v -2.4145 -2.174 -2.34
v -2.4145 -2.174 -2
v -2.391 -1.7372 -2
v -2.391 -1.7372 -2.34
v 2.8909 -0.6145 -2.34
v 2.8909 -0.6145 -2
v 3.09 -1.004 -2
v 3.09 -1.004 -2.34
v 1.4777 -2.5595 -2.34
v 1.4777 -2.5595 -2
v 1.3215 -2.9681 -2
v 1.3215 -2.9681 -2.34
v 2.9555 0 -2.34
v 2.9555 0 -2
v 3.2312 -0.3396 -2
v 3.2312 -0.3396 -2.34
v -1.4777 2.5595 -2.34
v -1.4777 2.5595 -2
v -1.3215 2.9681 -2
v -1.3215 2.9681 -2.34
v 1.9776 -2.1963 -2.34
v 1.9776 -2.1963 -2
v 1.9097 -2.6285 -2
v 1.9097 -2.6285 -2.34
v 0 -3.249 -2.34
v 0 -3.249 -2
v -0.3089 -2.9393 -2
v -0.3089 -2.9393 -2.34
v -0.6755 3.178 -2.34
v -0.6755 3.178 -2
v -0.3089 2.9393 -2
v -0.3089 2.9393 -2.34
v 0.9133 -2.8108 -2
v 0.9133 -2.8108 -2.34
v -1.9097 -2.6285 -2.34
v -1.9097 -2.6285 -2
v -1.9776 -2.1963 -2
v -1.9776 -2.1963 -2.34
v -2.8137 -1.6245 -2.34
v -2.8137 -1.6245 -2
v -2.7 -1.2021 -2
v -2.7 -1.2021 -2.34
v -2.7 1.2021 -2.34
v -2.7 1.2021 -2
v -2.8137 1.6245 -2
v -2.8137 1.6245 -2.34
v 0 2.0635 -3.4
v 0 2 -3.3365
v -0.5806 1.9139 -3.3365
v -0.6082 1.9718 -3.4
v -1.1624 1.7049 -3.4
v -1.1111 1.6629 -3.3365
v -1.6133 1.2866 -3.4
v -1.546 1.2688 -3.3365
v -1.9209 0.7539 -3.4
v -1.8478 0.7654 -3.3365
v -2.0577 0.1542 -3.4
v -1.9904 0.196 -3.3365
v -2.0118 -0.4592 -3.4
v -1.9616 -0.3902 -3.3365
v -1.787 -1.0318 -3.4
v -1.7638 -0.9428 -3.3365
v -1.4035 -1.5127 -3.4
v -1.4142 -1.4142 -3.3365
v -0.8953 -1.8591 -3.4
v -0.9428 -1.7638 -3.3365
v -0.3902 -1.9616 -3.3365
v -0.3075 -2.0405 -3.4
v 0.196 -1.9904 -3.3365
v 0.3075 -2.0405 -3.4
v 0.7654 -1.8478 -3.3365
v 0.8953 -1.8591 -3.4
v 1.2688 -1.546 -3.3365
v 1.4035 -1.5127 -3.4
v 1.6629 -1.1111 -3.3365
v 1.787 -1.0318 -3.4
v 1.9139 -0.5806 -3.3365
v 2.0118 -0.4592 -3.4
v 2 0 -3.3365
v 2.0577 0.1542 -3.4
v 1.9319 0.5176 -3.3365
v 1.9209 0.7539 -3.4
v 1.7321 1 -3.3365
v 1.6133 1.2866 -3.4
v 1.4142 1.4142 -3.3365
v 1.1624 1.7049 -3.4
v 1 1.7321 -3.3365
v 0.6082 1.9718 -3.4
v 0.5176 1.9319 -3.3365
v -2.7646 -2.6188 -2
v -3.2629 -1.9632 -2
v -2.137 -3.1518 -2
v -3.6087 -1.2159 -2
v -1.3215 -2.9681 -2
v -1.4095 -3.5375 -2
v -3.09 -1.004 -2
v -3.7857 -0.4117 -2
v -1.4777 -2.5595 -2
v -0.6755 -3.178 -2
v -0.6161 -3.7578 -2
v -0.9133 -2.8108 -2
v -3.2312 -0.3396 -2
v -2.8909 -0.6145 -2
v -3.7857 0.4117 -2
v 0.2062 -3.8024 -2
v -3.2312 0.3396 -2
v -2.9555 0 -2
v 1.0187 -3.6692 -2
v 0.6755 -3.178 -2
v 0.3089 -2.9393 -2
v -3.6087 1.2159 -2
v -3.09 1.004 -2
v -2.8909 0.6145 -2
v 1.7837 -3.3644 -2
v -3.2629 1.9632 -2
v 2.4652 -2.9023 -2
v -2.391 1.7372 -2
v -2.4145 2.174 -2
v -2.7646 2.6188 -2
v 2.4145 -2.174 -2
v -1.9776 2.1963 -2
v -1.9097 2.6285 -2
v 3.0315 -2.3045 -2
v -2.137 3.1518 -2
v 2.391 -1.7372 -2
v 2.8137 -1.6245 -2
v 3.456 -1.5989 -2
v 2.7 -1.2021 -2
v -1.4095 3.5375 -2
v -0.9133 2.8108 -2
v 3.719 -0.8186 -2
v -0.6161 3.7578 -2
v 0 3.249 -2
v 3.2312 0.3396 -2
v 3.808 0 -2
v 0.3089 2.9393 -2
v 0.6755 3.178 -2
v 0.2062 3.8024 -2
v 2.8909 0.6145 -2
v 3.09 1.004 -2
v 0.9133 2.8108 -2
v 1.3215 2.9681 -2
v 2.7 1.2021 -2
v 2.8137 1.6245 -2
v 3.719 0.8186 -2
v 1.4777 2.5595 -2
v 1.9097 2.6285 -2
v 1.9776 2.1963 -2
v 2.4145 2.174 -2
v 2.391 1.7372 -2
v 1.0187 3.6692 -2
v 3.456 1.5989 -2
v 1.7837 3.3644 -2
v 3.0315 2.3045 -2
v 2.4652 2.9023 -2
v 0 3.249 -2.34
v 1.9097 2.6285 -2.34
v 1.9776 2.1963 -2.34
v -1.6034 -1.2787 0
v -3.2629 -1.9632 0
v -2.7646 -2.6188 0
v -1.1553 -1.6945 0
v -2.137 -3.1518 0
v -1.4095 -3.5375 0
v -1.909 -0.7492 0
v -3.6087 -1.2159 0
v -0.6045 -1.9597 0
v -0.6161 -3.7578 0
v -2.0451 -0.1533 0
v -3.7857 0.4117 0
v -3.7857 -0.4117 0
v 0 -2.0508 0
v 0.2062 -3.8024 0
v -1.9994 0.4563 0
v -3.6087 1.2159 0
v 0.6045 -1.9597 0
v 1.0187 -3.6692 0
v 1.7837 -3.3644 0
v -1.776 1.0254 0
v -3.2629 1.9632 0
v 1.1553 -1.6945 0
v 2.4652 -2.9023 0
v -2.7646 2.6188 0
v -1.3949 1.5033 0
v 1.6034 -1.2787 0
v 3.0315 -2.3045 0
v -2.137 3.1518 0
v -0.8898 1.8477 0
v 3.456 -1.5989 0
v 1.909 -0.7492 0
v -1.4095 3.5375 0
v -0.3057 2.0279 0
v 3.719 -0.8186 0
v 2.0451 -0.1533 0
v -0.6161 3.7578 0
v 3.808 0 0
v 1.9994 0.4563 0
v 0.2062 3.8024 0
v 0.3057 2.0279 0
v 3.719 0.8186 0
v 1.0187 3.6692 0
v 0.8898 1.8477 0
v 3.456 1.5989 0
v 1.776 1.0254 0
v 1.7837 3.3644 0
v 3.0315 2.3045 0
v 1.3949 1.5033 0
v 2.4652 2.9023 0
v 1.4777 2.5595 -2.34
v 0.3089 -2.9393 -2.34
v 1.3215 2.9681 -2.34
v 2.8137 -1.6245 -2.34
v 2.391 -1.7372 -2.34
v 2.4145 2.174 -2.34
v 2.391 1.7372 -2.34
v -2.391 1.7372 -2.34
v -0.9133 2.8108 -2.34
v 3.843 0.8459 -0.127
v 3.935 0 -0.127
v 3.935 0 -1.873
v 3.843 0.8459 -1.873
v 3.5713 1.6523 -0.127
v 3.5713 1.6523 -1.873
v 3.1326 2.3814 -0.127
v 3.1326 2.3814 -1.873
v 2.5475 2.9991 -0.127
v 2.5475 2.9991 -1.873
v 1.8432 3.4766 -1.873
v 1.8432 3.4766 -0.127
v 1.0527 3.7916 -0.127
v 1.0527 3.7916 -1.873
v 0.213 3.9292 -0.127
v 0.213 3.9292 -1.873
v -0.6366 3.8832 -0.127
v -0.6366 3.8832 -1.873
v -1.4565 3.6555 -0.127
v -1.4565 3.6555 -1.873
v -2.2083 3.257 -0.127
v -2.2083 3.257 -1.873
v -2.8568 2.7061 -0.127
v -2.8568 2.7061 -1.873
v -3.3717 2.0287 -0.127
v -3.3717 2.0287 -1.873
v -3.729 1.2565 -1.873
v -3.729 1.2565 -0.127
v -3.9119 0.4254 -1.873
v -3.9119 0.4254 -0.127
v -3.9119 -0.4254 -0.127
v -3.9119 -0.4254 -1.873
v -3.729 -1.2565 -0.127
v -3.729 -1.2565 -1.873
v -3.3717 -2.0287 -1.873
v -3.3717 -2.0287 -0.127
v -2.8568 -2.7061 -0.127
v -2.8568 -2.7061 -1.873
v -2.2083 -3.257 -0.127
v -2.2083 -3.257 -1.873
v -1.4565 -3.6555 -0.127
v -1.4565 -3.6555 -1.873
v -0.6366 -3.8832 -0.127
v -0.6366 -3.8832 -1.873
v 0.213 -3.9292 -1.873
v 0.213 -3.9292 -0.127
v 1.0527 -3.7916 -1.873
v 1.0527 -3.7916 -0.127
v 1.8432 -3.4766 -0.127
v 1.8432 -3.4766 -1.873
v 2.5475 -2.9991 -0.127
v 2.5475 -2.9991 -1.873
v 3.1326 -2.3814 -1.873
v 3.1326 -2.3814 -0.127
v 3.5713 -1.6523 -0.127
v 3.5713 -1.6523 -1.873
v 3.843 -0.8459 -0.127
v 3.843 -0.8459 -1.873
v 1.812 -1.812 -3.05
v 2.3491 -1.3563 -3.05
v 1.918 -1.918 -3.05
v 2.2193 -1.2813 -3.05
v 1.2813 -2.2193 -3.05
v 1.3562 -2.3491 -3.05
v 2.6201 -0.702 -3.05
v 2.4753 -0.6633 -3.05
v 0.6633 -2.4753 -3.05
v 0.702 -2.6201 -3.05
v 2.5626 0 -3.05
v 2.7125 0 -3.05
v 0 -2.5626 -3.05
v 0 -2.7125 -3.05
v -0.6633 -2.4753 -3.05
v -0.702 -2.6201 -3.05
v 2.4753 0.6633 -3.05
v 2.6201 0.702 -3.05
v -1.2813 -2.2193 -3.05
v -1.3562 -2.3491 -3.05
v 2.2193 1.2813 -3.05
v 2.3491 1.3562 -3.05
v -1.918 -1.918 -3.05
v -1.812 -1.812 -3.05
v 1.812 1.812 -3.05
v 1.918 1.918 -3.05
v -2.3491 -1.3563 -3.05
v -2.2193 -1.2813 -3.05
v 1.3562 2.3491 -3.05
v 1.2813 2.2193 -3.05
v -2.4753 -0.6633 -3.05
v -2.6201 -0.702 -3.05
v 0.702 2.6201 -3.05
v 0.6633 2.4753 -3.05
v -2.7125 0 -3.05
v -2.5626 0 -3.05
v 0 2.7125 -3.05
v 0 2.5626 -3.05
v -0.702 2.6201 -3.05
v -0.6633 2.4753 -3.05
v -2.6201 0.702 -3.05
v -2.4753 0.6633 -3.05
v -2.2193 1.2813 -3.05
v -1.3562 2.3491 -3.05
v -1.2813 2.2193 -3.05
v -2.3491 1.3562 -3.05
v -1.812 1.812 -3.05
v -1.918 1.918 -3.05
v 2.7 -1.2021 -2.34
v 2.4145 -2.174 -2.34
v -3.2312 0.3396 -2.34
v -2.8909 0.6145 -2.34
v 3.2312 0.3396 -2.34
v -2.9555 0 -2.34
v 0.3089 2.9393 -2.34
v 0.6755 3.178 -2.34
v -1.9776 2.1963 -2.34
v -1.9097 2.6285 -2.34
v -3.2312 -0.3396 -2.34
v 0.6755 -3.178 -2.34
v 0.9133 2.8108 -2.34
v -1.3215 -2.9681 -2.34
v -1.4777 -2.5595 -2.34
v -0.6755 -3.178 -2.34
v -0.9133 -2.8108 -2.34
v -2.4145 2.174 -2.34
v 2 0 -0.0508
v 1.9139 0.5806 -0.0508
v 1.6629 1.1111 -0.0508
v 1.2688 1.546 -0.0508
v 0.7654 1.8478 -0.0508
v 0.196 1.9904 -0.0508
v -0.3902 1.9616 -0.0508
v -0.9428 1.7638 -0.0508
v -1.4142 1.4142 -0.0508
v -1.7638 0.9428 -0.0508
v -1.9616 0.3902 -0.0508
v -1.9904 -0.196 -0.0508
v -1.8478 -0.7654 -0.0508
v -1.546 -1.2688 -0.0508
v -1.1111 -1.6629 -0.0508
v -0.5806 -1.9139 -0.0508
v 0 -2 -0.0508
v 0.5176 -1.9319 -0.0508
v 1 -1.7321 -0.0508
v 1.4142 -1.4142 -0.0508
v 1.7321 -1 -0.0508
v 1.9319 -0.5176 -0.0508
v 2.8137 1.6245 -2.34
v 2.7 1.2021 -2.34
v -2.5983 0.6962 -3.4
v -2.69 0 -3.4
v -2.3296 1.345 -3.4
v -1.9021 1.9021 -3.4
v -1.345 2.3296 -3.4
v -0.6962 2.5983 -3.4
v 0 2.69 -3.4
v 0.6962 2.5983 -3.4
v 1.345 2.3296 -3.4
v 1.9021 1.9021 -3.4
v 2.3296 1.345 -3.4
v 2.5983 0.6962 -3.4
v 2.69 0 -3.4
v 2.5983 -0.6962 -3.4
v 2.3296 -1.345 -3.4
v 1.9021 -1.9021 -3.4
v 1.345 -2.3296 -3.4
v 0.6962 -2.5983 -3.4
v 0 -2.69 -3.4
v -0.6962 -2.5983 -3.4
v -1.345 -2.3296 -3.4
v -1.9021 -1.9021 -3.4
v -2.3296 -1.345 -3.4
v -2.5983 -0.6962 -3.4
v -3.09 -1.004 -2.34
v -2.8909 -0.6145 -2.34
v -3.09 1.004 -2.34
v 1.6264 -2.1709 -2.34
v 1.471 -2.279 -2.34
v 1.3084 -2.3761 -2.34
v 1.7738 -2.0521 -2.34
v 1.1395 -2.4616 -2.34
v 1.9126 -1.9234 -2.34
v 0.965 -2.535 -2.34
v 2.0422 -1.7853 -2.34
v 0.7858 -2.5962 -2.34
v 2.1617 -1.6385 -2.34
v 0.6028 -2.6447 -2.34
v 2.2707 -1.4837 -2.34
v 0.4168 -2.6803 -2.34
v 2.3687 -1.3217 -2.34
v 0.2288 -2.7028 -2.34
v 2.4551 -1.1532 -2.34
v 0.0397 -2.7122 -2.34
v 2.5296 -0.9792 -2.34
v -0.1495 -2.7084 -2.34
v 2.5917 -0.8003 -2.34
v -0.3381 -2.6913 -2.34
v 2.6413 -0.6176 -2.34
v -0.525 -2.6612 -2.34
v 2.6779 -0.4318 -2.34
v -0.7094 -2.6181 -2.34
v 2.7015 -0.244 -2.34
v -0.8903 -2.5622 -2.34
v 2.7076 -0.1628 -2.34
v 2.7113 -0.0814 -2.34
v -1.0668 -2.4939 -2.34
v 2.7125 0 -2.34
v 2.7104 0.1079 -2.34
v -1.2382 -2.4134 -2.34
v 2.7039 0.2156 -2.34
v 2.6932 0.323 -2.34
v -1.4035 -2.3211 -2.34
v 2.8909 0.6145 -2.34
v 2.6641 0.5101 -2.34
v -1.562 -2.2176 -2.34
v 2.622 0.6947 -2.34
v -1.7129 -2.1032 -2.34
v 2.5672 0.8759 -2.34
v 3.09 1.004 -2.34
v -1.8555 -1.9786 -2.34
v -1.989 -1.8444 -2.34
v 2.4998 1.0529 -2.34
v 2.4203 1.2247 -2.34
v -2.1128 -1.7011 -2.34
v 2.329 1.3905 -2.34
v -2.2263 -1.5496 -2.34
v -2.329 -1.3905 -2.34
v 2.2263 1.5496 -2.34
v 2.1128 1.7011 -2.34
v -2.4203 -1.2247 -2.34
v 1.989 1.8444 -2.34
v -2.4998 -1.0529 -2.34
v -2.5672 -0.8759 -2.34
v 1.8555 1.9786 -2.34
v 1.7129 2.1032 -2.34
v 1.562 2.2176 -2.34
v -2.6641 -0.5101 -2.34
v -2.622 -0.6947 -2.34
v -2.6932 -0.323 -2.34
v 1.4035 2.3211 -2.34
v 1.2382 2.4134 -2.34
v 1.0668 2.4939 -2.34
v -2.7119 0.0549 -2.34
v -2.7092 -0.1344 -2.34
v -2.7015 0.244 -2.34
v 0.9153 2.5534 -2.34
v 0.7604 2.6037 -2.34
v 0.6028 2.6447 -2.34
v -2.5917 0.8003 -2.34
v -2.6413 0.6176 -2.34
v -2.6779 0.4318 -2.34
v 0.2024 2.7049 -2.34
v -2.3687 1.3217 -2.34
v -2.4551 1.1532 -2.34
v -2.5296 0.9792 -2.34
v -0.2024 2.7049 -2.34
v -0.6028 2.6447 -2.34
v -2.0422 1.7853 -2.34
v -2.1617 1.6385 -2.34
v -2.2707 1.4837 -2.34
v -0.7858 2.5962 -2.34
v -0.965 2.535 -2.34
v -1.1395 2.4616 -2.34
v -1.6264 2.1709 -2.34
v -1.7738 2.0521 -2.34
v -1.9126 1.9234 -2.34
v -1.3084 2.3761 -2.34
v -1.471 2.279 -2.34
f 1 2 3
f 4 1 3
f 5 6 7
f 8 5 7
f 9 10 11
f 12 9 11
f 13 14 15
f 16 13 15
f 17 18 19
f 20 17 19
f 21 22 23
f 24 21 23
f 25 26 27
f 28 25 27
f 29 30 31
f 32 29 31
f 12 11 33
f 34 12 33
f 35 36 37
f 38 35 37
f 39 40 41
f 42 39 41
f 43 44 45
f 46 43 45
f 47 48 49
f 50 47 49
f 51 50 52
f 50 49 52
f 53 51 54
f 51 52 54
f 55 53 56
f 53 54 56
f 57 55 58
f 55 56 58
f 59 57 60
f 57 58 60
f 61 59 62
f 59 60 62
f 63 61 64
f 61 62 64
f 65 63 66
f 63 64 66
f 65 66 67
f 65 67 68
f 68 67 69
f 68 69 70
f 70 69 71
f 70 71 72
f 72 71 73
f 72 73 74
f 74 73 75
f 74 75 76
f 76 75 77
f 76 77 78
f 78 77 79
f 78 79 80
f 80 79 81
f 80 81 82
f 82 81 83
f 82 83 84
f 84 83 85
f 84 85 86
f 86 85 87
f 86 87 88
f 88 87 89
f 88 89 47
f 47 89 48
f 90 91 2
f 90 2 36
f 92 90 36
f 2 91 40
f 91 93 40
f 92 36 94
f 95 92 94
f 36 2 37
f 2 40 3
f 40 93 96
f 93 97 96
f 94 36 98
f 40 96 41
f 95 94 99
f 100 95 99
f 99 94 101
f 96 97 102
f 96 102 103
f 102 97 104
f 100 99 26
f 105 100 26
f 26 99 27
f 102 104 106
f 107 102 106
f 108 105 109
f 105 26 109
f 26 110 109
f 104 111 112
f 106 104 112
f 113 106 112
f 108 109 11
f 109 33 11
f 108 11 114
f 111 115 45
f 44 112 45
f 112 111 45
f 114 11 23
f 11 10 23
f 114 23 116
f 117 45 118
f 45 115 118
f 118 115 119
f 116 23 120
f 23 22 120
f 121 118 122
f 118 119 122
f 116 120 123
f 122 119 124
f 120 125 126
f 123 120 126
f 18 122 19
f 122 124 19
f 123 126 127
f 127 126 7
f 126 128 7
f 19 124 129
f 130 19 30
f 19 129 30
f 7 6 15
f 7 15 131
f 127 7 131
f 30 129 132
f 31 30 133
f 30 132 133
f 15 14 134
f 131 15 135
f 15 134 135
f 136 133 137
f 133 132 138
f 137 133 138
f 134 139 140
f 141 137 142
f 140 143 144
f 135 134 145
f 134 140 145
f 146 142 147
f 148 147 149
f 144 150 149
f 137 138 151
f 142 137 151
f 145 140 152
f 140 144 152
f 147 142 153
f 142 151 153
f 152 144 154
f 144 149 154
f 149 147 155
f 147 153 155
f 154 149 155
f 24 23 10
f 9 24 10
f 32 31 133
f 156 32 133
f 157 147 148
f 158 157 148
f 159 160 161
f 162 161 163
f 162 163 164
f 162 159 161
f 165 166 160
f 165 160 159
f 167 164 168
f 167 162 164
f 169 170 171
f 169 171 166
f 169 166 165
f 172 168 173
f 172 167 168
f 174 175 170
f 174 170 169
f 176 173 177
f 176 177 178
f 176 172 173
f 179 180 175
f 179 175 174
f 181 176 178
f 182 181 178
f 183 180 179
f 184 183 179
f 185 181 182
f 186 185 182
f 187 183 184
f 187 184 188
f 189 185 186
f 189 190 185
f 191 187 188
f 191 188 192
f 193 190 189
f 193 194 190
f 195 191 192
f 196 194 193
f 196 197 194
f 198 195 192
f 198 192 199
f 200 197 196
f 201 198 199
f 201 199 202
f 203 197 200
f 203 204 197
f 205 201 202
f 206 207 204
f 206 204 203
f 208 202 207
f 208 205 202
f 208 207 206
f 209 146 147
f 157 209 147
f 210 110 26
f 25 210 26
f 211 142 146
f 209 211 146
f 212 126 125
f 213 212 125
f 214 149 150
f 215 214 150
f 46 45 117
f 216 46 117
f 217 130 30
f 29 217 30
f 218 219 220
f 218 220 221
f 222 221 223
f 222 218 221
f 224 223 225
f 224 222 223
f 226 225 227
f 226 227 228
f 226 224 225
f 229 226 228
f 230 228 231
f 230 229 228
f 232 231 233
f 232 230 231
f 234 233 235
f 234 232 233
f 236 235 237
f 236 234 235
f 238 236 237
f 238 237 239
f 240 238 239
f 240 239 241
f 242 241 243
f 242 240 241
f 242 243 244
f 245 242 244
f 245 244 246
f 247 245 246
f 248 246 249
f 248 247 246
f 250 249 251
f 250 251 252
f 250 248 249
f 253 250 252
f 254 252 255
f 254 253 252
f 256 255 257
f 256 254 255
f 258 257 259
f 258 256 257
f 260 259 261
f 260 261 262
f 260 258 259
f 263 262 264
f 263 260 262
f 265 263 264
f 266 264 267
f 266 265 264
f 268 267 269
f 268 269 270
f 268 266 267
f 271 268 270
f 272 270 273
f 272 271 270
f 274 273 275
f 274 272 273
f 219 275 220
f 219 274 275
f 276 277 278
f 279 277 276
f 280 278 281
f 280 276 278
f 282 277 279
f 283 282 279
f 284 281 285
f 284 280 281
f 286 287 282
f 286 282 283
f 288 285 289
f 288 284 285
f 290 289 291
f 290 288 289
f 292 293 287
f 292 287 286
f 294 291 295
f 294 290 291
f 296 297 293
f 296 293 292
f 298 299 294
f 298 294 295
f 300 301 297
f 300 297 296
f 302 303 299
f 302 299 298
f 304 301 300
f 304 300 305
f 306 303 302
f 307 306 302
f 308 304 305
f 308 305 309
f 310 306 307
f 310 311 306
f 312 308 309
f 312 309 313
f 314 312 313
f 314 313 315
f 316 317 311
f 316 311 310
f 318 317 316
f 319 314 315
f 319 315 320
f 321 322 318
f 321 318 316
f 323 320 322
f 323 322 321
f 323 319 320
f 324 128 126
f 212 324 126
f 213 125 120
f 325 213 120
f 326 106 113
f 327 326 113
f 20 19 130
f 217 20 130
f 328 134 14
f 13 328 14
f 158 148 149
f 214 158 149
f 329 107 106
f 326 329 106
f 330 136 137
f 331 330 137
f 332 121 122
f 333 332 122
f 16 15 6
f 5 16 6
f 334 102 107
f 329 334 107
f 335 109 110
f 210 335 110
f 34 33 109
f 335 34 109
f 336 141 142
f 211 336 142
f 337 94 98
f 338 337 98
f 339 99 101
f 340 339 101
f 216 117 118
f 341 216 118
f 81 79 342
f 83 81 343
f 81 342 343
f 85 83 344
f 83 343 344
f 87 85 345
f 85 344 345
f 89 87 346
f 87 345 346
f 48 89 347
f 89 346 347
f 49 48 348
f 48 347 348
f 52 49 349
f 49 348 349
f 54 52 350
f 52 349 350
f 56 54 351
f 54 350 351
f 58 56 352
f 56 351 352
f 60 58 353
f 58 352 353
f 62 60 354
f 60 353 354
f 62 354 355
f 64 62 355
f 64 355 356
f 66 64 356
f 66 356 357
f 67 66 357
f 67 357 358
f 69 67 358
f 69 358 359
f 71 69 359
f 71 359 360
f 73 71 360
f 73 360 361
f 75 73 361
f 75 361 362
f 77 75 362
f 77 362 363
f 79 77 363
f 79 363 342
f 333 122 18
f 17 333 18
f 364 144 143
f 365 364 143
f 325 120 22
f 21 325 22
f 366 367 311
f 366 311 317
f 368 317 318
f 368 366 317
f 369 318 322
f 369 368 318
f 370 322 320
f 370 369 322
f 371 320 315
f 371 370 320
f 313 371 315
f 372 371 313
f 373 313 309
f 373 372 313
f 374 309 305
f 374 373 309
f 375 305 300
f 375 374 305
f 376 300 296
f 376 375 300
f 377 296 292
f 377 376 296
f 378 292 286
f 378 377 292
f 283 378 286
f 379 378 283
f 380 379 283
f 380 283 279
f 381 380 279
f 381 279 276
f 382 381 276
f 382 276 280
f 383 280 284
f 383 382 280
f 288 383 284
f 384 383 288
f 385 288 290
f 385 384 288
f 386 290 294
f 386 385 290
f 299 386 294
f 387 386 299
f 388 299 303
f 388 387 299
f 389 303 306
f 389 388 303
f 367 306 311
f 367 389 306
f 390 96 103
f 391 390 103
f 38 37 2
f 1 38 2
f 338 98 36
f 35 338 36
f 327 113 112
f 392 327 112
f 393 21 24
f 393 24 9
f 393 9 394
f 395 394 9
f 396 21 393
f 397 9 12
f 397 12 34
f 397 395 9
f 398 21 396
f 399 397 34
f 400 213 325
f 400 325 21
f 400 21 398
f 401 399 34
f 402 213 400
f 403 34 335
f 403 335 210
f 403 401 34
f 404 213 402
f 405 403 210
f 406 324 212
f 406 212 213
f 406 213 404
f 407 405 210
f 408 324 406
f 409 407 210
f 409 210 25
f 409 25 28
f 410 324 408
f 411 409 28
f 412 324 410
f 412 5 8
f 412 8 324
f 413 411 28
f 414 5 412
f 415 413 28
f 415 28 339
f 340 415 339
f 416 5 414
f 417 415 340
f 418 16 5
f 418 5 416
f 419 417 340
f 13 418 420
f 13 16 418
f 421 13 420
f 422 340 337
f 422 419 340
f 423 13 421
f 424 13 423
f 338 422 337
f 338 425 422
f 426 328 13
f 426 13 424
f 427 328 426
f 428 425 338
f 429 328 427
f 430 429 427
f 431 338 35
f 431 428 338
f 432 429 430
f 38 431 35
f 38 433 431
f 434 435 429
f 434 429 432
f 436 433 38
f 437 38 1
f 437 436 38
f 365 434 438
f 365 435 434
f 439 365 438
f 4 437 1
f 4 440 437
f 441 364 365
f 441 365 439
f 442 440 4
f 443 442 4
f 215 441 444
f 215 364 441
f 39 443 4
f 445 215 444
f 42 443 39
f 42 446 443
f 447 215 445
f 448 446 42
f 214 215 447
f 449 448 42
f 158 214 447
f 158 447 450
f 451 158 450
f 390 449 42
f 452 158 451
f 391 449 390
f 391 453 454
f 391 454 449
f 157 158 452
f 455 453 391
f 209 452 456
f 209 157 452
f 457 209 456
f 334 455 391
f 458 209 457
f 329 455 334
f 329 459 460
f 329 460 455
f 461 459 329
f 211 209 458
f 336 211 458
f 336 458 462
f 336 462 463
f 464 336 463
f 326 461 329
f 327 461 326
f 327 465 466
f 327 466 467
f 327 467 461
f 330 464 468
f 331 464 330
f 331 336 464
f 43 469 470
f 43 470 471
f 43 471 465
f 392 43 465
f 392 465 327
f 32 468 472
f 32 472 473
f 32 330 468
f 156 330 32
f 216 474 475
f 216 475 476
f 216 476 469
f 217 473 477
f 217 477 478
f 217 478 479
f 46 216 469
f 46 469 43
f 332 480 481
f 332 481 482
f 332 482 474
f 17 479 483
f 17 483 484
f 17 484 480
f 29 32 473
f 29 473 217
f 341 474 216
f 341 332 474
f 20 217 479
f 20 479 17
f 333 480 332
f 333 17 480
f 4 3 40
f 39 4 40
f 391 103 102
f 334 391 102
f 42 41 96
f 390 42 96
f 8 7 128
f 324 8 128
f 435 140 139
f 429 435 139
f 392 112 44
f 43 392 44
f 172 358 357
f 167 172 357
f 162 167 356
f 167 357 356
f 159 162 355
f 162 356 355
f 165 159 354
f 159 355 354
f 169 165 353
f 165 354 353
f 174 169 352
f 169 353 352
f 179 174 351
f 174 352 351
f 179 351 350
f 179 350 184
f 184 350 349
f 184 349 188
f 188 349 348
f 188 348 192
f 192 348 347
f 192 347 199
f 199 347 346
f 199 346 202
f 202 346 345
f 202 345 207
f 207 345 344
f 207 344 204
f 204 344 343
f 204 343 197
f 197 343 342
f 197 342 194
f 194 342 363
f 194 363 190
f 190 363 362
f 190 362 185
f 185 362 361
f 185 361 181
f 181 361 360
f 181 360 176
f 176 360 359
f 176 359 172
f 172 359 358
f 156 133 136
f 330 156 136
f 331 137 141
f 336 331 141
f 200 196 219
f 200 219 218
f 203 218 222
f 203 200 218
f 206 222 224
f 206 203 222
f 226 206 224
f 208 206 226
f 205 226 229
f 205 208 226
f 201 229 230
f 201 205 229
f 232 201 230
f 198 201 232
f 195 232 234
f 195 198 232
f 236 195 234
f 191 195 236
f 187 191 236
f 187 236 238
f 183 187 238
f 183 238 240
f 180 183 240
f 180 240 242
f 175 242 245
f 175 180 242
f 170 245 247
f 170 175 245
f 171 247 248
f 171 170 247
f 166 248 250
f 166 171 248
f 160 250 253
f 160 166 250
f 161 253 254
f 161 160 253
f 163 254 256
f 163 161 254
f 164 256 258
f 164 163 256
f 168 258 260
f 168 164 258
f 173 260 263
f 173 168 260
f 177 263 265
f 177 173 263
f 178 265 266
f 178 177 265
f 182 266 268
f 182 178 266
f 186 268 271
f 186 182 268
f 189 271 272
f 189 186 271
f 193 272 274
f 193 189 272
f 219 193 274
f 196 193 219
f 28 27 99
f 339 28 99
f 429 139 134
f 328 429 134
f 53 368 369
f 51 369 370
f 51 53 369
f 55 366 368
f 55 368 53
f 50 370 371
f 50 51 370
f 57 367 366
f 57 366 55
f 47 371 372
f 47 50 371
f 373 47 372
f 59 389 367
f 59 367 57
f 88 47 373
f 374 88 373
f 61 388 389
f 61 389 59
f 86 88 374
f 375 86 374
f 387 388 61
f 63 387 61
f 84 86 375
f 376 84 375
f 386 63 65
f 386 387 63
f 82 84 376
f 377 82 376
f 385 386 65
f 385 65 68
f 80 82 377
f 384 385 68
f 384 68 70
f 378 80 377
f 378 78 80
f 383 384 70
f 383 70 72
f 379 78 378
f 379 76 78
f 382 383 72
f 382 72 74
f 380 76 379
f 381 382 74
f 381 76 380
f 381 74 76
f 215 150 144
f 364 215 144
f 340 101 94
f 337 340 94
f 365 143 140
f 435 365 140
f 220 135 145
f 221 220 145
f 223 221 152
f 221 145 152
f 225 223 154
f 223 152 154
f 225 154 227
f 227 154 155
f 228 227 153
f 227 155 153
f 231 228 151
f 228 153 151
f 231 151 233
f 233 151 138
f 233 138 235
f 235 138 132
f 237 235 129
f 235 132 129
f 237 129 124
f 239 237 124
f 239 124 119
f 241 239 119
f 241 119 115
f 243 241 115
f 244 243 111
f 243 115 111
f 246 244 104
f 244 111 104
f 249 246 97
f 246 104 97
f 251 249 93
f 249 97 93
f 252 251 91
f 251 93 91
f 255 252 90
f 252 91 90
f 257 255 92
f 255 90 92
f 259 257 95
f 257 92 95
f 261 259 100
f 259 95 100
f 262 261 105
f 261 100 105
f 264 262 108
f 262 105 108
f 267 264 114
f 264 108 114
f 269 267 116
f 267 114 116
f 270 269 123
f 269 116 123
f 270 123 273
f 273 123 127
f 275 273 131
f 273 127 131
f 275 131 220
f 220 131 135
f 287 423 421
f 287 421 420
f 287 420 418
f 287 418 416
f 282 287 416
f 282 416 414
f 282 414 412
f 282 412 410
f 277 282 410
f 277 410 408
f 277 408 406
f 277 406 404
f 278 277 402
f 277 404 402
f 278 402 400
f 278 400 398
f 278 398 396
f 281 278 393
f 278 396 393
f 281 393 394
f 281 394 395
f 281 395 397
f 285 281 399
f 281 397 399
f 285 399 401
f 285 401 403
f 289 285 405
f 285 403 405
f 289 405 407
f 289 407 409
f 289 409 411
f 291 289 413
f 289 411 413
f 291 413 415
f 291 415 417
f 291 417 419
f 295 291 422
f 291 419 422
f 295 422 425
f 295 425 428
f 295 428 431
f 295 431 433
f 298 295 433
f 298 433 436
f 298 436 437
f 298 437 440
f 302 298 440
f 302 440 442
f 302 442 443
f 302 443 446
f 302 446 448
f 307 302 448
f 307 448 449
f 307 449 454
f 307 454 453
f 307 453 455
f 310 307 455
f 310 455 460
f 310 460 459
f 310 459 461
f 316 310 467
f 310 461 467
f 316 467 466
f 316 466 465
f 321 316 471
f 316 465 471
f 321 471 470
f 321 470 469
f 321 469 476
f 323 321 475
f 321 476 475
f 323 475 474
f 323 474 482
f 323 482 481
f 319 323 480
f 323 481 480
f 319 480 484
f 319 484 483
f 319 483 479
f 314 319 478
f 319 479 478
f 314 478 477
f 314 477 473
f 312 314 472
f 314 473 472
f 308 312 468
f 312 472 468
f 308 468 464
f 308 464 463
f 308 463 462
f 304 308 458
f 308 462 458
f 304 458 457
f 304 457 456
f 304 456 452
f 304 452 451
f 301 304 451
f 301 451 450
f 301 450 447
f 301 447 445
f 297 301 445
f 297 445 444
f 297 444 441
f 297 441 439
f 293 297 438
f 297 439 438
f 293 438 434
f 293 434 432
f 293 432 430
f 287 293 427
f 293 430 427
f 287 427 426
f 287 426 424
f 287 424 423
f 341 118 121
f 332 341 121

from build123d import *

# Parameters (mm, degrees)
SKETCH1_R           = 3.935
EXTRUDE1_DEPTH      = 2
SKETCH2_R           = 2.7125
EXTRUDE2_DEPTH      = 1.4
SKETCH5_OUTSIDE_W   = 12.452
SKETCH5_OUTSIDE_H   = 12.452
SKETCH5_OUTSIDE_R   = 2.69
CUT_EXTRUDE1_DEPTH  = 0.35
CUT_EXTRUDE1_DRAFT  = 20
CHAMFER2_SIZE       = 0.127
SKETCH7_R           = 2
CUT_EXTRUDE3_DEPTH  = 7.521384056
BOSS_EXTRUDE1_DEPTH = 0.34
CIRPATTERN4_COUNT   = 30


with BuildPart() as part:
    # Sketch1 → Extrude1 (new body)
    with BuildSketch(Plane.XY):
        Circle(SKETCH1_R)
    extrude(amount=-EXTRUDE1_DEPTH)

    # Sketch2 → Extrude2 (add)
    with BuildSketch(Plane(origin=(0, 0, -2), x_dir=(-1, 0, 0), z_dir=(0, 0, -1))):
        Circle(SKETCH2_R)
    extrude(amount=EXTRUDE2_DEPTH)


with BuildPart() as cut_extrude1_tool:
    # Sketch5 outside → Cut-Extrude1 (with draft: the straight prism first)
    with BuildSketch(Plane(origin=(0, 0, -3.4), x_dir=(-1, 0, 0), z_dir=(0, 0, -1))):
        Rectangle(SKETCH5_OUTSIDE_W, SKETCH5_OUTSIDE_H)
        Circle(SKETCH5_OUTSIDE_R, mode=Mode.SUBTRACT)
    extrude(amount=-CUT_EXTRUDE1_DEPTH)
    # Cut-Extrude1: the draft: its side faces are tilted about the plane it starts from
    cut_extrude1_sides = [cut_extrude1_tool.faces().sort_by_distance(p)[0] for p in [
        (0, -6.226, -3.225),
        (-6.226, 0, -3.225),
        (0, 6.226, -3.225),
        (6.226, 0, -3.225),
        (2.69, 0, -3.225),
    ]]
    draft(cut_extrude1_sides, Plane(origin=(0, 0, -3.4), x_dir=(-1, 0, 0), z_dir=(0, 0, -1)), CUT_EXTRUDE1_DRAFT)


with BuildPart() as part_1:
    add(part.part)

    # Cut-Extrude1: cut by cut_extrude1_tool
    add(cut_extrude1_tool.part, mode=Mode.SUBTRACT)

    # Chamfer2
    chamfer2_edges = [part_1.edges().sort_by_distance(p)[0] for p in [
        (-3.935, 0, 0),
        (-3.935, 0, -2),
    ]]
    chamfer(chamfer2_edges, length=CHAMFER2_SIZE)

    # Sketch7 → Cut-Extrude3 (cut, through all)
    with BuildSketch(Plane.XY):
        Circle(SKETCH7_R)
    extrude(amount=-CUT_EXTRUDE3_DEPTH, mode=Mode.SUBTRACT)

    # Cut-Extrude6 cone 1 section (through the dimple's axis) → Cut-Extrude6 (revolve, cut)
    with BuildSketch(Plane(origin=(0, 0, 0), x_dir=(0, -1, 0), z_dir=(1, 0, 0))):
        Polygon((0, 0), (2.0508, 0), (0, 2.0508), align=None)
    revolve(axis=Axis((0, 0, 0), (0, 0, -1)), mode=Mode.SUBTRACT)

    # Cut-Extrude7 cone 1 section (through the dimple's axis) → Cut-Extrude7 (revolve, cut)
    with BuildSketch(Plane(origin=(0, 0, -3.4), x_dir=(0, 1, 0), z_dir=(1, 0, 0))):
        Polygon((0, 0), (2.0635, 0), (0, 2.0635), align=None)
    revolve(axis=Axis((0, 0, -3.4), (0, 0, 1)), mode=Mode.SUBTRACT)

    # Sketch16 → Boss-Extrude1 (add)
    with BuildSketch(Plane(origin=(0, 0, -2), x_dir=(-1, 0, 0), z_dir=(0, 0, -1))):
        with BuildLine():
            Line((0, 3.249), (-0.602777778, 2.644676767))
            ThreePointArc((-0.602777778, 2.644676767), (0, 2.7125), (0.602777778, 2.644676767))
            Line((0.602777778, 2.644676767), (0, 3.249))
        make_face()
    boss_extrude1 = extrude(amount=BOSS_EXTRUDE1_DEPTH)

    # CirPattern4: Boss-Extrude1 ×30 about axis
    cirpattern4_axis = Axis((0, 0, -3.4), (0, 0, -1))
    for i in range(1, CIRPATTERN4_COUNT):
        add(boss_extrude1.rotate(cirpattern4_axis, i * 360 / CIRPATTERN4_COUNT))


solid = part_1.part
